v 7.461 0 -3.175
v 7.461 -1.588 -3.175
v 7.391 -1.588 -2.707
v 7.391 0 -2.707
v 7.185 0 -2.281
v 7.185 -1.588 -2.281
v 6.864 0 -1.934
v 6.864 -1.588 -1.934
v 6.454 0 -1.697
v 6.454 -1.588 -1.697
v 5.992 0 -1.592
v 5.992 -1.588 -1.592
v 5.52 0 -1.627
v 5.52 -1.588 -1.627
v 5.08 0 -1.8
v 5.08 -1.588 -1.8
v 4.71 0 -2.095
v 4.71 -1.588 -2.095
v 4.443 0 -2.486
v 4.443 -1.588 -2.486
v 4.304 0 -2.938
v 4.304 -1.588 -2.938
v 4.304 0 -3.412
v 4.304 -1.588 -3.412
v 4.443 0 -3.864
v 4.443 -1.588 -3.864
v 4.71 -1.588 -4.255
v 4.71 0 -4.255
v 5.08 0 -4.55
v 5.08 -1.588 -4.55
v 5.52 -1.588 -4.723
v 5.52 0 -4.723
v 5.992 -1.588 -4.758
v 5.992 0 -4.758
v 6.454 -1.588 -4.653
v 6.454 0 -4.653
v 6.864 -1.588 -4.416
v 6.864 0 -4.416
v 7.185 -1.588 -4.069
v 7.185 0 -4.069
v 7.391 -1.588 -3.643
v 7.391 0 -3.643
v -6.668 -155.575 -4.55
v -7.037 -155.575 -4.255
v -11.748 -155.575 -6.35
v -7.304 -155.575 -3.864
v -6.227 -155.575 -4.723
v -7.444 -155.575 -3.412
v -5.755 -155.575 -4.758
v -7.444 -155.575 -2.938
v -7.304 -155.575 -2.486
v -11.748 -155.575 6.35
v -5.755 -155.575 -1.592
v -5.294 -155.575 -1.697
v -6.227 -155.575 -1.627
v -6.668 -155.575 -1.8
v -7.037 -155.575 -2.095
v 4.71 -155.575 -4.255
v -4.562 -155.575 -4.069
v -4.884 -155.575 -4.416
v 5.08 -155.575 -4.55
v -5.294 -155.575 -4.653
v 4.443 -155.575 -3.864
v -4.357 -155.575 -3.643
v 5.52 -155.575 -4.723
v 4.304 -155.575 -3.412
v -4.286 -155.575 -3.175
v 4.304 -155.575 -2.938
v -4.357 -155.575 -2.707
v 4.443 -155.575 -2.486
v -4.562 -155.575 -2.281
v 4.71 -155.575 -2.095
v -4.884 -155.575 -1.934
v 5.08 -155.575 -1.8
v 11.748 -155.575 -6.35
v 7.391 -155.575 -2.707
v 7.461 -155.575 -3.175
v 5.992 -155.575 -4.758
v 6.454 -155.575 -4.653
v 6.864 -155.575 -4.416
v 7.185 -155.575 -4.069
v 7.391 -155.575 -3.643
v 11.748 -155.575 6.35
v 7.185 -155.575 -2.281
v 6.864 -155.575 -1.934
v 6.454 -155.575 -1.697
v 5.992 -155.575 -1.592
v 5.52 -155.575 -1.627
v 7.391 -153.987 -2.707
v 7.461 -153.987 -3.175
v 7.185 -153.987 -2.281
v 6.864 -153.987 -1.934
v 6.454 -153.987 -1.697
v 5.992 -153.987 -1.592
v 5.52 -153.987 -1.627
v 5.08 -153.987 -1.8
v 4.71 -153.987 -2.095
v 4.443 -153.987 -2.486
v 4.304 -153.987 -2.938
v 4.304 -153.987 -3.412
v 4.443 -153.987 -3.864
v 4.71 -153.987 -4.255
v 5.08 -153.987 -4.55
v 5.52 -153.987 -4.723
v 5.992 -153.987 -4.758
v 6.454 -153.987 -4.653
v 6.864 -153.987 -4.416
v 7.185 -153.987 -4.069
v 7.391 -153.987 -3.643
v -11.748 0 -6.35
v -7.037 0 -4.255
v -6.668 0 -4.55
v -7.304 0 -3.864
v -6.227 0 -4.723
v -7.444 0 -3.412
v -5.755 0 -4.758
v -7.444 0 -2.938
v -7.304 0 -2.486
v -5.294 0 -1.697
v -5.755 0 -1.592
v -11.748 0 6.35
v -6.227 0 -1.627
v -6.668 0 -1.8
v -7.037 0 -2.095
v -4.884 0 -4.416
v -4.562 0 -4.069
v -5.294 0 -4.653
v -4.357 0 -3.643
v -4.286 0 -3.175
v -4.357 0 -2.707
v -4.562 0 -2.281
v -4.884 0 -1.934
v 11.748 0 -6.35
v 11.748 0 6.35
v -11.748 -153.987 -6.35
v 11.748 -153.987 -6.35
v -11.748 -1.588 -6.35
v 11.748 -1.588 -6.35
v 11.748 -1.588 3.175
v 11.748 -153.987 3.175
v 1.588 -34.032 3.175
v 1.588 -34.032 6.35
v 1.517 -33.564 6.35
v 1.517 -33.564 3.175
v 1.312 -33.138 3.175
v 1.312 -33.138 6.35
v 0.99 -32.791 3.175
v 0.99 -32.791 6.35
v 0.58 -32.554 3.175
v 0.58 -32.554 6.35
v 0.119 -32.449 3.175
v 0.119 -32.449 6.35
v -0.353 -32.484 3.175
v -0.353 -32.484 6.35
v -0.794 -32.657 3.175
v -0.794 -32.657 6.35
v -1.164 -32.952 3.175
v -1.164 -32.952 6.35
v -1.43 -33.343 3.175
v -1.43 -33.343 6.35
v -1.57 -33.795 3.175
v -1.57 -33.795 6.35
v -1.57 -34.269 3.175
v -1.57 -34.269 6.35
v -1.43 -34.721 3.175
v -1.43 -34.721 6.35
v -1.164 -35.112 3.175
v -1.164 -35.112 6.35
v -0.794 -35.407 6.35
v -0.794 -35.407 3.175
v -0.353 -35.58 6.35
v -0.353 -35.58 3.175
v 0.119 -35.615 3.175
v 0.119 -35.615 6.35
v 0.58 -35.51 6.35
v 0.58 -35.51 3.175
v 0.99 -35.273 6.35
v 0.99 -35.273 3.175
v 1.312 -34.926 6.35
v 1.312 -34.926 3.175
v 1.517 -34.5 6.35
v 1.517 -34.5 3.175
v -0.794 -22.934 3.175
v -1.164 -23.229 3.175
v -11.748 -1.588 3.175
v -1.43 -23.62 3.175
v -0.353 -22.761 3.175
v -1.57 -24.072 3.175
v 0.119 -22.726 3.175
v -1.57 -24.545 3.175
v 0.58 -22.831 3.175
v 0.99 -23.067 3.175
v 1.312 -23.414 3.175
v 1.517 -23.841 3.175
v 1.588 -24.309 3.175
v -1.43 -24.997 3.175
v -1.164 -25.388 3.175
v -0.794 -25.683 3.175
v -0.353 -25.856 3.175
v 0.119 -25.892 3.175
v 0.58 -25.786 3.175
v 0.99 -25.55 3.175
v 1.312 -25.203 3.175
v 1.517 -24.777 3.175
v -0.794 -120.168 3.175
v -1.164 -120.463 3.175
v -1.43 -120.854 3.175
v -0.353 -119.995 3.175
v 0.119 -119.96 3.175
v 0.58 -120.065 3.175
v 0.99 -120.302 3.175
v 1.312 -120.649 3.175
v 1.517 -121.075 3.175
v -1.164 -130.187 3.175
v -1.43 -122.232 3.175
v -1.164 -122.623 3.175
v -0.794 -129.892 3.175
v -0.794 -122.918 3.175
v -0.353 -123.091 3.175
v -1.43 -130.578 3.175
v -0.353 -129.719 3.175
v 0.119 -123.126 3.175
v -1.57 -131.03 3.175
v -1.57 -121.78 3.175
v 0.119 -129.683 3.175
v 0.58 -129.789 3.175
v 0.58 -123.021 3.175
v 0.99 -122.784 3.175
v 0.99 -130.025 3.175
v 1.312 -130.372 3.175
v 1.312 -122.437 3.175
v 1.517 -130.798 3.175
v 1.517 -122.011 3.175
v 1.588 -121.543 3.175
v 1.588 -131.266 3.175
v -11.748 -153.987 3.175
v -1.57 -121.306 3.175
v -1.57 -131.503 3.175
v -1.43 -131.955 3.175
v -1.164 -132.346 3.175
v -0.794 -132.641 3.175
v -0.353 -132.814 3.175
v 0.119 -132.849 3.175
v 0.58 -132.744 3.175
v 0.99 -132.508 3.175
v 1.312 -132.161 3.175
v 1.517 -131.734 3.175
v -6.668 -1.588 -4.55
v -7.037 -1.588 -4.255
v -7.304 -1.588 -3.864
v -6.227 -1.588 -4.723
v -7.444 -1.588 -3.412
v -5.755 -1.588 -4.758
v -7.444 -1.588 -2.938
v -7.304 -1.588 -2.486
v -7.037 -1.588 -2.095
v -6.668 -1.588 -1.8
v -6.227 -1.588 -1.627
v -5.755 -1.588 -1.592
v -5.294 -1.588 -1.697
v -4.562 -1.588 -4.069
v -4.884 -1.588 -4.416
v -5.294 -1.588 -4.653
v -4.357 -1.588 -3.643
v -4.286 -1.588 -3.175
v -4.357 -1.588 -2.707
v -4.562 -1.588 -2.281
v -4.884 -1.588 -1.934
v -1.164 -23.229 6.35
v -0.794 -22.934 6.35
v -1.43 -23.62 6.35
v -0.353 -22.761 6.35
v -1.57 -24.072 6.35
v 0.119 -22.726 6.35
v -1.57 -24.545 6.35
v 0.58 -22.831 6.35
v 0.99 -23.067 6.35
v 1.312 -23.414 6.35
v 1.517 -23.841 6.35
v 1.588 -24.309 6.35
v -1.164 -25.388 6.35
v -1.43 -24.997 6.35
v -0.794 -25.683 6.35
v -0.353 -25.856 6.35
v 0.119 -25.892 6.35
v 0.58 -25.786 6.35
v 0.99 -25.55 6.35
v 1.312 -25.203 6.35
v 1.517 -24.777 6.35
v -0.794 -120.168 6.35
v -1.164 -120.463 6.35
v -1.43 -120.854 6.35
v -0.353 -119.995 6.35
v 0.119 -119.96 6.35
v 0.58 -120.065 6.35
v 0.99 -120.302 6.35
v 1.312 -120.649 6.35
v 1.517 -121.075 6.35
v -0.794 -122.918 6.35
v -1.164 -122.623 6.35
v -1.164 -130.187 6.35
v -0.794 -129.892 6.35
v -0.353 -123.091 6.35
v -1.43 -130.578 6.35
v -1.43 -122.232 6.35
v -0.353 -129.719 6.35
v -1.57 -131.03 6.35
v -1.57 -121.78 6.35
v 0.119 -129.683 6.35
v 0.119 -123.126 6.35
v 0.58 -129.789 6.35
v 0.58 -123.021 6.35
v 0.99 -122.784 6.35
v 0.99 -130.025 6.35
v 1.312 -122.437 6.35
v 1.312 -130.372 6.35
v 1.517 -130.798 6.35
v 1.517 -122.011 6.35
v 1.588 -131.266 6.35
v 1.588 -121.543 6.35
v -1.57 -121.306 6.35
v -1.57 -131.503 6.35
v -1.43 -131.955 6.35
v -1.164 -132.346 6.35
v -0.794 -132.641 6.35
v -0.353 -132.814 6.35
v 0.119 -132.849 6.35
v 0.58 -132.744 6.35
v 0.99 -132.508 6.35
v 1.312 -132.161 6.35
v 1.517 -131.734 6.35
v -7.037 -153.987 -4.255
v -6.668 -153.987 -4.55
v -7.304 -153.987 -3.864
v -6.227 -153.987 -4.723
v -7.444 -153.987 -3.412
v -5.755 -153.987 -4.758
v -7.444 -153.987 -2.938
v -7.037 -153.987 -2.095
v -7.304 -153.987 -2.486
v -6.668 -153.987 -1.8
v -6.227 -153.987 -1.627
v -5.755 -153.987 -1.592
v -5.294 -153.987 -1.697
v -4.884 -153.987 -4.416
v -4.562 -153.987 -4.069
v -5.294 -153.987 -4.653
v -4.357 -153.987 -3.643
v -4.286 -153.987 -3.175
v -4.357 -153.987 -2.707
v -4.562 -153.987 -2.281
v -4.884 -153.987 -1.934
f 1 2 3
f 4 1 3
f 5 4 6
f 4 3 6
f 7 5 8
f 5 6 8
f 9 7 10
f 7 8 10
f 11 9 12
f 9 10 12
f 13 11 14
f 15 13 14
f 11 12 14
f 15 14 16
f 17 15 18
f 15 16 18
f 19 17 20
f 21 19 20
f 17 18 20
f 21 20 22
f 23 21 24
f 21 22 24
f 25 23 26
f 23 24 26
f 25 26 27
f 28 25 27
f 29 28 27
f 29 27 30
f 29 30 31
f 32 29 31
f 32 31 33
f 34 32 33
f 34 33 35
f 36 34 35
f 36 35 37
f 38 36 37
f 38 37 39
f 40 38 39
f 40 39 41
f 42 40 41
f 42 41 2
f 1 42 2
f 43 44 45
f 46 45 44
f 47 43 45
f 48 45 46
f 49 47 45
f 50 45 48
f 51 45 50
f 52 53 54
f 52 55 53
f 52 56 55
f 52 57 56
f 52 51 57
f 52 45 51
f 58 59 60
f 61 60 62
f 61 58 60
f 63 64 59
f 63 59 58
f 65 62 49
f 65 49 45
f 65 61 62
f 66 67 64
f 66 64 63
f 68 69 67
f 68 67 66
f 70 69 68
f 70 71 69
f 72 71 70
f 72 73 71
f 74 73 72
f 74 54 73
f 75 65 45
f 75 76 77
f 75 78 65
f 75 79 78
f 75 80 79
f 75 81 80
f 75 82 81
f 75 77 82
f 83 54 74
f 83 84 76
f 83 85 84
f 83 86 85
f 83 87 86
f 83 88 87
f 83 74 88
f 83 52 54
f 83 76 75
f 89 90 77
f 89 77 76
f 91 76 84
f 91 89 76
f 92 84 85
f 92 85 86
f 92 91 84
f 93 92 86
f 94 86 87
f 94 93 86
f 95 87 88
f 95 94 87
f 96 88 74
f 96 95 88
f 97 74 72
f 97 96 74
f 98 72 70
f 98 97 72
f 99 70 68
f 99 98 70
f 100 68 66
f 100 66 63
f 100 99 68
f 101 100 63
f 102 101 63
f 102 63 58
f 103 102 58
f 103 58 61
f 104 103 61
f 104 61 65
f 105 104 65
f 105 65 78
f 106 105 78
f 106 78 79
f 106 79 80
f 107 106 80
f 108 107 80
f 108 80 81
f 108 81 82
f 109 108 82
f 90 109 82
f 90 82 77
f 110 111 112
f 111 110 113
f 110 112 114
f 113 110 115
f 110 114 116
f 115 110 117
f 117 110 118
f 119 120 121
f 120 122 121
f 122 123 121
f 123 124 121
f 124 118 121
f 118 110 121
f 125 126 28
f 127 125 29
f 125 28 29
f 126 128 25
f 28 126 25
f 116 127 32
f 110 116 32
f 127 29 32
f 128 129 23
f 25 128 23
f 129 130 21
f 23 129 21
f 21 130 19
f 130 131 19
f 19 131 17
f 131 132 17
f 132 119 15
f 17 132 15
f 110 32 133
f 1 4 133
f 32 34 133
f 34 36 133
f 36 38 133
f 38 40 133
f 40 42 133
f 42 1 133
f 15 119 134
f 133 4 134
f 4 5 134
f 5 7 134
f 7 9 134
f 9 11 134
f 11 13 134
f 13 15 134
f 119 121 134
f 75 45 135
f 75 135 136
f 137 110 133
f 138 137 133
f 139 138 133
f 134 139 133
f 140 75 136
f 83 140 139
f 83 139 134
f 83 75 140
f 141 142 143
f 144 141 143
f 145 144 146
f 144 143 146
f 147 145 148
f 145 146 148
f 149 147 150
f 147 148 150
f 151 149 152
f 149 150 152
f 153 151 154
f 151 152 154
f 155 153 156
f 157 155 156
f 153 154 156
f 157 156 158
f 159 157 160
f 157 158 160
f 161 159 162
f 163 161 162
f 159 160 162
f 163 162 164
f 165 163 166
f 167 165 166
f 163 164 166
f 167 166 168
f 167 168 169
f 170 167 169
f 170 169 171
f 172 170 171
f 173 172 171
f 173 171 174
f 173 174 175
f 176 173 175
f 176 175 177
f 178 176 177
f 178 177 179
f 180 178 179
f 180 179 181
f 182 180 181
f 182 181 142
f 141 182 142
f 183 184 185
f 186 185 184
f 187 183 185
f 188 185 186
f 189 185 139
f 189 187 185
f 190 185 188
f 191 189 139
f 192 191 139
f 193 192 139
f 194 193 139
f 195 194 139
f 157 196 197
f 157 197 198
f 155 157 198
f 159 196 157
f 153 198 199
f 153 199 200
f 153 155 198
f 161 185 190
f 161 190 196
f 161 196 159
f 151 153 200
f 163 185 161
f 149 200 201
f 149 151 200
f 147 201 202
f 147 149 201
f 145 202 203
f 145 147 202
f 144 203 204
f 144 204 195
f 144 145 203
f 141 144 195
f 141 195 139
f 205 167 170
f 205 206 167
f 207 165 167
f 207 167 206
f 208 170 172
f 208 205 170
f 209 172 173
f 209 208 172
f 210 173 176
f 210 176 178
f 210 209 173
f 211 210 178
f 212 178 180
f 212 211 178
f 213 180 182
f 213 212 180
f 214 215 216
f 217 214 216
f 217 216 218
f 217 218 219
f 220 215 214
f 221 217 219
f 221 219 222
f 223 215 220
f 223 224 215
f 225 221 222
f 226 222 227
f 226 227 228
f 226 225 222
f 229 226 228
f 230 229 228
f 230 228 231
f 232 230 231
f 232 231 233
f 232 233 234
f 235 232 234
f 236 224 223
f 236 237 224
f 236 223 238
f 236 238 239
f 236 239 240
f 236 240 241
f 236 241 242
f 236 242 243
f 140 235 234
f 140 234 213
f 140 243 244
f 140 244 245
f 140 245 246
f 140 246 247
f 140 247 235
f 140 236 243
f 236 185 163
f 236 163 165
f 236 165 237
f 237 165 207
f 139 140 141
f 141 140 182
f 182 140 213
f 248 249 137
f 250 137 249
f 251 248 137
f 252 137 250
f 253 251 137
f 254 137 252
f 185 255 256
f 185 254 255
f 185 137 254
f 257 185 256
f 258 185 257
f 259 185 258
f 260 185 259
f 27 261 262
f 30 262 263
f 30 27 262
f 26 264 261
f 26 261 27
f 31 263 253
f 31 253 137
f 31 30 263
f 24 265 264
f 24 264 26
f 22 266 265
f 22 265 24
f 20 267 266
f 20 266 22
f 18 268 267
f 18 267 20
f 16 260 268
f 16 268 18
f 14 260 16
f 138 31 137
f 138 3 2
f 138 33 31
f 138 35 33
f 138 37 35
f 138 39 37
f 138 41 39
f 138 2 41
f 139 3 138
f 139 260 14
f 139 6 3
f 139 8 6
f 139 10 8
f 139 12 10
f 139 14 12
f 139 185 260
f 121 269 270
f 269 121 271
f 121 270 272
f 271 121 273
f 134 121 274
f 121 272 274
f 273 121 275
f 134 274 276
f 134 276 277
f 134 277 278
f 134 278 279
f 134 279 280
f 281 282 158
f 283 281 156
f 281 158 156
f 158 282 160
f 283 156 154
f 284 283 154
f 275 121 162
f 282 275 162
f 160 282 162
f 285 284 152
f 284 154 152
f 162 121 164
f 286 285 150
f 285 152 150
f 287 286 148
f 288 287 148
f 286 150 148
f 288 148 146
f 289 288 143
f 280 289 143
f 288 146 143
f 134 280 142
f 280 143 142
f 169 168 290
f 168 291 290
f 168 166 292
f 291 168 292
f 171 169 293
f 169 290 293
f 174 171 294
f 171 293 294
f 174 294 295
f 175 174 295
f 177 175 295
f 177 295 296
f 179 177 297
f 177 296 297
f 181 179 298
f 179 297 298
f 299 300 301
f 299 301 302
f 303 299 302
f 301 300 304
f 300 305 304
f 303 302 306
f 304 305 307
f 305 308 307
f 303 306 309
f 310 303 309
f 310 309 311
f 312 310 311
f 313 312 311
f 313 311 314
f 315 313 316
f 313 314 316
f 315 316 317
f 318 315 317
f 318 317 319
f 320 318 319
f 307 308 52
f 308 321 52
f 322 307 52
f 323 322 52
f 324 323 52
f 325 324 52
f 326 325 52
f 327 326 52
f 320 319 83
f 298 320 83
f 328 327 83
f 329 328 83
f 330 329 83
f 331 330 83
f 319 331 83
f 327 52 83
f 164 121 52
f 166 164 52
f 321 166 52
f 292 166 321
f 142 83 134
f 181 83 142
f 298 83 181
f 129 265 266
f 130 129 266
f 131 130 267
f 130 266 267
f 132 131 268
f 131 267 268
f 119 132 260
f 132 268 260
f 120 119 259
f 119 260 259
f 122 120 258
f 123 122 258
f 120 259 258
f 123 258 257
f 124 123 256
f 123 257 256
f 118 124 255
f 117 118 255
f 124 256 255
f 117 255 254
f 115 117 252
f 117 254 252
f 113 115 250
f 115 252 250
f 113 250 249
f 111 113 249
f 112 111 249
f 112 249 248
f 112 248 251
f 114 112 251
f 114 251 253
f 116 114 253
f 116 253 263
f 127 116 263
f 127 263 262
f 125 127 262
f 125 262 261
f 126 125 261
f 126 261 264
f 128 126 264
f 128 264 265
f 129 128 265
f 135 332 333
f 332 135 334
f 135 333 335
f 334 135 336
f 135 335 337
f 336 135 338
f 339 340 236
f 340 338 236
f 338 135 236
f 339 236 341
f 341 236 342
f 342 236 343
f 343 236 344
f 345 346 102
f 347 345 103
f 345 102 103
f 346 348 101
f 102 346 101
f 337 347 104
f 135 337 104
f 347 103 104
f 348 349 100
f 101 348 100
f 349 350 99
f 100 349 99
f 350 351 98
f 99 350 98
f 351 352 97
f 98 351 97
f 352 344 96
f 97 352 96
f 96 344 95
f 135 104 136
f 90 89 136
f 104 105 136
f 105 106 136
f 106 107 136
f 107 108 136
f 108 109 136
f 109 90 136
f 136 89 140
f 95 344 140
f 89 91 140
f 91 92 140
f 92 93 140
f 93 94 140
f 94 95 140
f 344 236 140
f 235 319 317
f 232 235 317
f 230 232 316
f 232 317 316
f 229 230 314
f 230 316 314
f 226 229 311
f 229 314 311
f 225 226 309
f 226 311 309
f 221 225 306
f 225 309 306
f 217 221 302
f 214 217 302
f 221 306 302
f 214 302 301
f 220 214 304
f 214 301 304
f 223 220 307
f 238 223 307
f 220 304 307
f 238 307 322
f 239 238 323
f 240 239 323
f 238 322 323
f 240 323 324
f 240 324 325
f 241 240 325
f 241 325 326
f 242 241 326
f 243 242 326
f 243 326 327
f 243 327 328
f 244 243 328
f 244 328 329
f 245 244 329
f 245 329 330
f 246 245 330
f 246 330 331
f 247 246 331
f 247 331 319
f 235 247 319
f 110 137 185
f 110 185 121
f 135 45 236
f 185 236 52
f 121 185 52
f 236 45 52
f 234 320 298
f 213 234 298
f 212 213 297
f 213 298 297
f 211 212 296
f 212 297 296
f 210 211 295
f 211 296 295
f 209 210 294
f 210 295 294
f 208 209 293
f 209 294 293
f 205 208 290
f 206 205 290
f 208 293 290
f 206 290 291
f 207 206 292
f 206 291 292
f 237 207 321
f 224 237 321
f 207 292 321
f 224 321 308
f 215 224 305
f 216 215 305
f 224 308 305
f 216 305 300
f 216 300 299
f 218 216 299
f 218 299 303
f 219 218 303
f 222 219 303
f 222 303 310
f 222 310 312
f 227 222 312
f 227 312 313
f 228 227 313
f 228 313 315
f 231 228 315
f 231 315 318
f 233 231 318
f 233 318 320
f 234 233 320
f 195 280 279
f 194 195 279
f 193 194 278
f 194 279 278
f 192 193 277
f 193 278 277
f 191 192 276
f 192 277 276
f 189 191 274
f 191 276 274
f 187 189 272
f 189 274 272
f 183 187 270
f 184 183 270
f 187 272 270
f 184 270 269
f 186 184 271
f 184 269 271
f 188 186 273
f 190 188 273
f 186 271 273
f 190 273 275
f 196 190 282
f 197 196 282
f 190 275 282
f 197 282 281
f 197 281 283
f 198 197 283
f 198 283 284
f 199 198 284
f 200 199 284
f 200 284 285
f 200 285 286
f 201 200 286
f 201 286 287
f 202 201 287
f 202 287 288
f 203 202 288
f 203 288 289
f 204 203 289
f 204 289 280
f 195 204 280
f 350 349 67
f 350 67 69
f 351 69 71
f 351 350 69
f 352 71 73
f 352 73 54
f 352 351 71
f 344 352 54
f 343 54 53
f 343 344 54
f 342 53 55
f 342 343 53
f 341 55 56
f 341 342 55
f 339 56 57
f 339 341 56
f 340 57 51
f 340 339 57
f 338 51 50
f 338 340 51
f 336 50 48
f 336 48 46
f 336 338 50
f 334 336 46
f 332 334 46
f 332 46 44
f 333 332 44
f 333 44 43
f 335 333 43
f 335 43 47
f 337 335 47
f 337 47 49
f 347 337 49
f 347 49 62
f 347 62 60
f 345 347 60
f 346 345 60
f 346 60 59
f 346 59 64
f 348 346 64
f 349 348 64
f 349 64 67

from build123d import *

# Parameters (mm, degrees)
F0_W     = 23.495
F0_H     = 12.7
F1_DEPTH = 1.5875
F2_R     = 1.5875
F3_DEPTH = 25.4
F4_W     = 23.495
F4_H     = 3.175
F5_DEPTH = 76.2
F7_R     = 1.5875
F8_DEPTH = 25.4


with BuildPart() as f1:
    # F0 (on Front) → F1 (new body)
    with BuildSketch(Plane.XZ):
        Rectangle(F0_W, F0_H)
    extrude(amount=F1_DEPTH)

    # F2 (on face) → F3 (cut)
    with BuildSketch(Plane.XZ.offset(1.5875)):
        with Locations((-5.87375, -3.175)):
            Circle(F2_R)
        with Locations((5.87375, -3.175)):
            Circle(F2_R)
    extrude(amount=-F3_DEPTH, mode=Mode.SUBTRACT)

    # F4 (on face) → F5 (join)
    with BuildSketch(Plane.XZ.offset(1.5875)):
        with Locations((0, 4.7625)):
            Rectangle(F4_W, F4_H)
    extrude(amount=F5_DEPTH)

    # F6: F1 across face


with BuildPart() as f1_1:
    add(f1.part)
    add(f1.part.mirror(Plane(origin=(0, -77.7875, 4.7625), x_dir=(1, 0, 0), z_dir=(0, -1, 0))))

    # F7 (on face) → F8 (cut)
    with BuildSketch(Plane.XY.offset(6.35)):
        with Locations((0, -34.032031)):
            Circle(F7_R)
        with Locations((0, -24.308594)):
            Circle(F7_R)
        with Locations((0, -131.266406)):
            Circle(F7_R)
        with Locations((0, -121.542969)):
            Circle(F7_R)
    extrude(amount=-F8_DEPTH, mode=Mode.SUBTRACT)


solid = f1_1.part
